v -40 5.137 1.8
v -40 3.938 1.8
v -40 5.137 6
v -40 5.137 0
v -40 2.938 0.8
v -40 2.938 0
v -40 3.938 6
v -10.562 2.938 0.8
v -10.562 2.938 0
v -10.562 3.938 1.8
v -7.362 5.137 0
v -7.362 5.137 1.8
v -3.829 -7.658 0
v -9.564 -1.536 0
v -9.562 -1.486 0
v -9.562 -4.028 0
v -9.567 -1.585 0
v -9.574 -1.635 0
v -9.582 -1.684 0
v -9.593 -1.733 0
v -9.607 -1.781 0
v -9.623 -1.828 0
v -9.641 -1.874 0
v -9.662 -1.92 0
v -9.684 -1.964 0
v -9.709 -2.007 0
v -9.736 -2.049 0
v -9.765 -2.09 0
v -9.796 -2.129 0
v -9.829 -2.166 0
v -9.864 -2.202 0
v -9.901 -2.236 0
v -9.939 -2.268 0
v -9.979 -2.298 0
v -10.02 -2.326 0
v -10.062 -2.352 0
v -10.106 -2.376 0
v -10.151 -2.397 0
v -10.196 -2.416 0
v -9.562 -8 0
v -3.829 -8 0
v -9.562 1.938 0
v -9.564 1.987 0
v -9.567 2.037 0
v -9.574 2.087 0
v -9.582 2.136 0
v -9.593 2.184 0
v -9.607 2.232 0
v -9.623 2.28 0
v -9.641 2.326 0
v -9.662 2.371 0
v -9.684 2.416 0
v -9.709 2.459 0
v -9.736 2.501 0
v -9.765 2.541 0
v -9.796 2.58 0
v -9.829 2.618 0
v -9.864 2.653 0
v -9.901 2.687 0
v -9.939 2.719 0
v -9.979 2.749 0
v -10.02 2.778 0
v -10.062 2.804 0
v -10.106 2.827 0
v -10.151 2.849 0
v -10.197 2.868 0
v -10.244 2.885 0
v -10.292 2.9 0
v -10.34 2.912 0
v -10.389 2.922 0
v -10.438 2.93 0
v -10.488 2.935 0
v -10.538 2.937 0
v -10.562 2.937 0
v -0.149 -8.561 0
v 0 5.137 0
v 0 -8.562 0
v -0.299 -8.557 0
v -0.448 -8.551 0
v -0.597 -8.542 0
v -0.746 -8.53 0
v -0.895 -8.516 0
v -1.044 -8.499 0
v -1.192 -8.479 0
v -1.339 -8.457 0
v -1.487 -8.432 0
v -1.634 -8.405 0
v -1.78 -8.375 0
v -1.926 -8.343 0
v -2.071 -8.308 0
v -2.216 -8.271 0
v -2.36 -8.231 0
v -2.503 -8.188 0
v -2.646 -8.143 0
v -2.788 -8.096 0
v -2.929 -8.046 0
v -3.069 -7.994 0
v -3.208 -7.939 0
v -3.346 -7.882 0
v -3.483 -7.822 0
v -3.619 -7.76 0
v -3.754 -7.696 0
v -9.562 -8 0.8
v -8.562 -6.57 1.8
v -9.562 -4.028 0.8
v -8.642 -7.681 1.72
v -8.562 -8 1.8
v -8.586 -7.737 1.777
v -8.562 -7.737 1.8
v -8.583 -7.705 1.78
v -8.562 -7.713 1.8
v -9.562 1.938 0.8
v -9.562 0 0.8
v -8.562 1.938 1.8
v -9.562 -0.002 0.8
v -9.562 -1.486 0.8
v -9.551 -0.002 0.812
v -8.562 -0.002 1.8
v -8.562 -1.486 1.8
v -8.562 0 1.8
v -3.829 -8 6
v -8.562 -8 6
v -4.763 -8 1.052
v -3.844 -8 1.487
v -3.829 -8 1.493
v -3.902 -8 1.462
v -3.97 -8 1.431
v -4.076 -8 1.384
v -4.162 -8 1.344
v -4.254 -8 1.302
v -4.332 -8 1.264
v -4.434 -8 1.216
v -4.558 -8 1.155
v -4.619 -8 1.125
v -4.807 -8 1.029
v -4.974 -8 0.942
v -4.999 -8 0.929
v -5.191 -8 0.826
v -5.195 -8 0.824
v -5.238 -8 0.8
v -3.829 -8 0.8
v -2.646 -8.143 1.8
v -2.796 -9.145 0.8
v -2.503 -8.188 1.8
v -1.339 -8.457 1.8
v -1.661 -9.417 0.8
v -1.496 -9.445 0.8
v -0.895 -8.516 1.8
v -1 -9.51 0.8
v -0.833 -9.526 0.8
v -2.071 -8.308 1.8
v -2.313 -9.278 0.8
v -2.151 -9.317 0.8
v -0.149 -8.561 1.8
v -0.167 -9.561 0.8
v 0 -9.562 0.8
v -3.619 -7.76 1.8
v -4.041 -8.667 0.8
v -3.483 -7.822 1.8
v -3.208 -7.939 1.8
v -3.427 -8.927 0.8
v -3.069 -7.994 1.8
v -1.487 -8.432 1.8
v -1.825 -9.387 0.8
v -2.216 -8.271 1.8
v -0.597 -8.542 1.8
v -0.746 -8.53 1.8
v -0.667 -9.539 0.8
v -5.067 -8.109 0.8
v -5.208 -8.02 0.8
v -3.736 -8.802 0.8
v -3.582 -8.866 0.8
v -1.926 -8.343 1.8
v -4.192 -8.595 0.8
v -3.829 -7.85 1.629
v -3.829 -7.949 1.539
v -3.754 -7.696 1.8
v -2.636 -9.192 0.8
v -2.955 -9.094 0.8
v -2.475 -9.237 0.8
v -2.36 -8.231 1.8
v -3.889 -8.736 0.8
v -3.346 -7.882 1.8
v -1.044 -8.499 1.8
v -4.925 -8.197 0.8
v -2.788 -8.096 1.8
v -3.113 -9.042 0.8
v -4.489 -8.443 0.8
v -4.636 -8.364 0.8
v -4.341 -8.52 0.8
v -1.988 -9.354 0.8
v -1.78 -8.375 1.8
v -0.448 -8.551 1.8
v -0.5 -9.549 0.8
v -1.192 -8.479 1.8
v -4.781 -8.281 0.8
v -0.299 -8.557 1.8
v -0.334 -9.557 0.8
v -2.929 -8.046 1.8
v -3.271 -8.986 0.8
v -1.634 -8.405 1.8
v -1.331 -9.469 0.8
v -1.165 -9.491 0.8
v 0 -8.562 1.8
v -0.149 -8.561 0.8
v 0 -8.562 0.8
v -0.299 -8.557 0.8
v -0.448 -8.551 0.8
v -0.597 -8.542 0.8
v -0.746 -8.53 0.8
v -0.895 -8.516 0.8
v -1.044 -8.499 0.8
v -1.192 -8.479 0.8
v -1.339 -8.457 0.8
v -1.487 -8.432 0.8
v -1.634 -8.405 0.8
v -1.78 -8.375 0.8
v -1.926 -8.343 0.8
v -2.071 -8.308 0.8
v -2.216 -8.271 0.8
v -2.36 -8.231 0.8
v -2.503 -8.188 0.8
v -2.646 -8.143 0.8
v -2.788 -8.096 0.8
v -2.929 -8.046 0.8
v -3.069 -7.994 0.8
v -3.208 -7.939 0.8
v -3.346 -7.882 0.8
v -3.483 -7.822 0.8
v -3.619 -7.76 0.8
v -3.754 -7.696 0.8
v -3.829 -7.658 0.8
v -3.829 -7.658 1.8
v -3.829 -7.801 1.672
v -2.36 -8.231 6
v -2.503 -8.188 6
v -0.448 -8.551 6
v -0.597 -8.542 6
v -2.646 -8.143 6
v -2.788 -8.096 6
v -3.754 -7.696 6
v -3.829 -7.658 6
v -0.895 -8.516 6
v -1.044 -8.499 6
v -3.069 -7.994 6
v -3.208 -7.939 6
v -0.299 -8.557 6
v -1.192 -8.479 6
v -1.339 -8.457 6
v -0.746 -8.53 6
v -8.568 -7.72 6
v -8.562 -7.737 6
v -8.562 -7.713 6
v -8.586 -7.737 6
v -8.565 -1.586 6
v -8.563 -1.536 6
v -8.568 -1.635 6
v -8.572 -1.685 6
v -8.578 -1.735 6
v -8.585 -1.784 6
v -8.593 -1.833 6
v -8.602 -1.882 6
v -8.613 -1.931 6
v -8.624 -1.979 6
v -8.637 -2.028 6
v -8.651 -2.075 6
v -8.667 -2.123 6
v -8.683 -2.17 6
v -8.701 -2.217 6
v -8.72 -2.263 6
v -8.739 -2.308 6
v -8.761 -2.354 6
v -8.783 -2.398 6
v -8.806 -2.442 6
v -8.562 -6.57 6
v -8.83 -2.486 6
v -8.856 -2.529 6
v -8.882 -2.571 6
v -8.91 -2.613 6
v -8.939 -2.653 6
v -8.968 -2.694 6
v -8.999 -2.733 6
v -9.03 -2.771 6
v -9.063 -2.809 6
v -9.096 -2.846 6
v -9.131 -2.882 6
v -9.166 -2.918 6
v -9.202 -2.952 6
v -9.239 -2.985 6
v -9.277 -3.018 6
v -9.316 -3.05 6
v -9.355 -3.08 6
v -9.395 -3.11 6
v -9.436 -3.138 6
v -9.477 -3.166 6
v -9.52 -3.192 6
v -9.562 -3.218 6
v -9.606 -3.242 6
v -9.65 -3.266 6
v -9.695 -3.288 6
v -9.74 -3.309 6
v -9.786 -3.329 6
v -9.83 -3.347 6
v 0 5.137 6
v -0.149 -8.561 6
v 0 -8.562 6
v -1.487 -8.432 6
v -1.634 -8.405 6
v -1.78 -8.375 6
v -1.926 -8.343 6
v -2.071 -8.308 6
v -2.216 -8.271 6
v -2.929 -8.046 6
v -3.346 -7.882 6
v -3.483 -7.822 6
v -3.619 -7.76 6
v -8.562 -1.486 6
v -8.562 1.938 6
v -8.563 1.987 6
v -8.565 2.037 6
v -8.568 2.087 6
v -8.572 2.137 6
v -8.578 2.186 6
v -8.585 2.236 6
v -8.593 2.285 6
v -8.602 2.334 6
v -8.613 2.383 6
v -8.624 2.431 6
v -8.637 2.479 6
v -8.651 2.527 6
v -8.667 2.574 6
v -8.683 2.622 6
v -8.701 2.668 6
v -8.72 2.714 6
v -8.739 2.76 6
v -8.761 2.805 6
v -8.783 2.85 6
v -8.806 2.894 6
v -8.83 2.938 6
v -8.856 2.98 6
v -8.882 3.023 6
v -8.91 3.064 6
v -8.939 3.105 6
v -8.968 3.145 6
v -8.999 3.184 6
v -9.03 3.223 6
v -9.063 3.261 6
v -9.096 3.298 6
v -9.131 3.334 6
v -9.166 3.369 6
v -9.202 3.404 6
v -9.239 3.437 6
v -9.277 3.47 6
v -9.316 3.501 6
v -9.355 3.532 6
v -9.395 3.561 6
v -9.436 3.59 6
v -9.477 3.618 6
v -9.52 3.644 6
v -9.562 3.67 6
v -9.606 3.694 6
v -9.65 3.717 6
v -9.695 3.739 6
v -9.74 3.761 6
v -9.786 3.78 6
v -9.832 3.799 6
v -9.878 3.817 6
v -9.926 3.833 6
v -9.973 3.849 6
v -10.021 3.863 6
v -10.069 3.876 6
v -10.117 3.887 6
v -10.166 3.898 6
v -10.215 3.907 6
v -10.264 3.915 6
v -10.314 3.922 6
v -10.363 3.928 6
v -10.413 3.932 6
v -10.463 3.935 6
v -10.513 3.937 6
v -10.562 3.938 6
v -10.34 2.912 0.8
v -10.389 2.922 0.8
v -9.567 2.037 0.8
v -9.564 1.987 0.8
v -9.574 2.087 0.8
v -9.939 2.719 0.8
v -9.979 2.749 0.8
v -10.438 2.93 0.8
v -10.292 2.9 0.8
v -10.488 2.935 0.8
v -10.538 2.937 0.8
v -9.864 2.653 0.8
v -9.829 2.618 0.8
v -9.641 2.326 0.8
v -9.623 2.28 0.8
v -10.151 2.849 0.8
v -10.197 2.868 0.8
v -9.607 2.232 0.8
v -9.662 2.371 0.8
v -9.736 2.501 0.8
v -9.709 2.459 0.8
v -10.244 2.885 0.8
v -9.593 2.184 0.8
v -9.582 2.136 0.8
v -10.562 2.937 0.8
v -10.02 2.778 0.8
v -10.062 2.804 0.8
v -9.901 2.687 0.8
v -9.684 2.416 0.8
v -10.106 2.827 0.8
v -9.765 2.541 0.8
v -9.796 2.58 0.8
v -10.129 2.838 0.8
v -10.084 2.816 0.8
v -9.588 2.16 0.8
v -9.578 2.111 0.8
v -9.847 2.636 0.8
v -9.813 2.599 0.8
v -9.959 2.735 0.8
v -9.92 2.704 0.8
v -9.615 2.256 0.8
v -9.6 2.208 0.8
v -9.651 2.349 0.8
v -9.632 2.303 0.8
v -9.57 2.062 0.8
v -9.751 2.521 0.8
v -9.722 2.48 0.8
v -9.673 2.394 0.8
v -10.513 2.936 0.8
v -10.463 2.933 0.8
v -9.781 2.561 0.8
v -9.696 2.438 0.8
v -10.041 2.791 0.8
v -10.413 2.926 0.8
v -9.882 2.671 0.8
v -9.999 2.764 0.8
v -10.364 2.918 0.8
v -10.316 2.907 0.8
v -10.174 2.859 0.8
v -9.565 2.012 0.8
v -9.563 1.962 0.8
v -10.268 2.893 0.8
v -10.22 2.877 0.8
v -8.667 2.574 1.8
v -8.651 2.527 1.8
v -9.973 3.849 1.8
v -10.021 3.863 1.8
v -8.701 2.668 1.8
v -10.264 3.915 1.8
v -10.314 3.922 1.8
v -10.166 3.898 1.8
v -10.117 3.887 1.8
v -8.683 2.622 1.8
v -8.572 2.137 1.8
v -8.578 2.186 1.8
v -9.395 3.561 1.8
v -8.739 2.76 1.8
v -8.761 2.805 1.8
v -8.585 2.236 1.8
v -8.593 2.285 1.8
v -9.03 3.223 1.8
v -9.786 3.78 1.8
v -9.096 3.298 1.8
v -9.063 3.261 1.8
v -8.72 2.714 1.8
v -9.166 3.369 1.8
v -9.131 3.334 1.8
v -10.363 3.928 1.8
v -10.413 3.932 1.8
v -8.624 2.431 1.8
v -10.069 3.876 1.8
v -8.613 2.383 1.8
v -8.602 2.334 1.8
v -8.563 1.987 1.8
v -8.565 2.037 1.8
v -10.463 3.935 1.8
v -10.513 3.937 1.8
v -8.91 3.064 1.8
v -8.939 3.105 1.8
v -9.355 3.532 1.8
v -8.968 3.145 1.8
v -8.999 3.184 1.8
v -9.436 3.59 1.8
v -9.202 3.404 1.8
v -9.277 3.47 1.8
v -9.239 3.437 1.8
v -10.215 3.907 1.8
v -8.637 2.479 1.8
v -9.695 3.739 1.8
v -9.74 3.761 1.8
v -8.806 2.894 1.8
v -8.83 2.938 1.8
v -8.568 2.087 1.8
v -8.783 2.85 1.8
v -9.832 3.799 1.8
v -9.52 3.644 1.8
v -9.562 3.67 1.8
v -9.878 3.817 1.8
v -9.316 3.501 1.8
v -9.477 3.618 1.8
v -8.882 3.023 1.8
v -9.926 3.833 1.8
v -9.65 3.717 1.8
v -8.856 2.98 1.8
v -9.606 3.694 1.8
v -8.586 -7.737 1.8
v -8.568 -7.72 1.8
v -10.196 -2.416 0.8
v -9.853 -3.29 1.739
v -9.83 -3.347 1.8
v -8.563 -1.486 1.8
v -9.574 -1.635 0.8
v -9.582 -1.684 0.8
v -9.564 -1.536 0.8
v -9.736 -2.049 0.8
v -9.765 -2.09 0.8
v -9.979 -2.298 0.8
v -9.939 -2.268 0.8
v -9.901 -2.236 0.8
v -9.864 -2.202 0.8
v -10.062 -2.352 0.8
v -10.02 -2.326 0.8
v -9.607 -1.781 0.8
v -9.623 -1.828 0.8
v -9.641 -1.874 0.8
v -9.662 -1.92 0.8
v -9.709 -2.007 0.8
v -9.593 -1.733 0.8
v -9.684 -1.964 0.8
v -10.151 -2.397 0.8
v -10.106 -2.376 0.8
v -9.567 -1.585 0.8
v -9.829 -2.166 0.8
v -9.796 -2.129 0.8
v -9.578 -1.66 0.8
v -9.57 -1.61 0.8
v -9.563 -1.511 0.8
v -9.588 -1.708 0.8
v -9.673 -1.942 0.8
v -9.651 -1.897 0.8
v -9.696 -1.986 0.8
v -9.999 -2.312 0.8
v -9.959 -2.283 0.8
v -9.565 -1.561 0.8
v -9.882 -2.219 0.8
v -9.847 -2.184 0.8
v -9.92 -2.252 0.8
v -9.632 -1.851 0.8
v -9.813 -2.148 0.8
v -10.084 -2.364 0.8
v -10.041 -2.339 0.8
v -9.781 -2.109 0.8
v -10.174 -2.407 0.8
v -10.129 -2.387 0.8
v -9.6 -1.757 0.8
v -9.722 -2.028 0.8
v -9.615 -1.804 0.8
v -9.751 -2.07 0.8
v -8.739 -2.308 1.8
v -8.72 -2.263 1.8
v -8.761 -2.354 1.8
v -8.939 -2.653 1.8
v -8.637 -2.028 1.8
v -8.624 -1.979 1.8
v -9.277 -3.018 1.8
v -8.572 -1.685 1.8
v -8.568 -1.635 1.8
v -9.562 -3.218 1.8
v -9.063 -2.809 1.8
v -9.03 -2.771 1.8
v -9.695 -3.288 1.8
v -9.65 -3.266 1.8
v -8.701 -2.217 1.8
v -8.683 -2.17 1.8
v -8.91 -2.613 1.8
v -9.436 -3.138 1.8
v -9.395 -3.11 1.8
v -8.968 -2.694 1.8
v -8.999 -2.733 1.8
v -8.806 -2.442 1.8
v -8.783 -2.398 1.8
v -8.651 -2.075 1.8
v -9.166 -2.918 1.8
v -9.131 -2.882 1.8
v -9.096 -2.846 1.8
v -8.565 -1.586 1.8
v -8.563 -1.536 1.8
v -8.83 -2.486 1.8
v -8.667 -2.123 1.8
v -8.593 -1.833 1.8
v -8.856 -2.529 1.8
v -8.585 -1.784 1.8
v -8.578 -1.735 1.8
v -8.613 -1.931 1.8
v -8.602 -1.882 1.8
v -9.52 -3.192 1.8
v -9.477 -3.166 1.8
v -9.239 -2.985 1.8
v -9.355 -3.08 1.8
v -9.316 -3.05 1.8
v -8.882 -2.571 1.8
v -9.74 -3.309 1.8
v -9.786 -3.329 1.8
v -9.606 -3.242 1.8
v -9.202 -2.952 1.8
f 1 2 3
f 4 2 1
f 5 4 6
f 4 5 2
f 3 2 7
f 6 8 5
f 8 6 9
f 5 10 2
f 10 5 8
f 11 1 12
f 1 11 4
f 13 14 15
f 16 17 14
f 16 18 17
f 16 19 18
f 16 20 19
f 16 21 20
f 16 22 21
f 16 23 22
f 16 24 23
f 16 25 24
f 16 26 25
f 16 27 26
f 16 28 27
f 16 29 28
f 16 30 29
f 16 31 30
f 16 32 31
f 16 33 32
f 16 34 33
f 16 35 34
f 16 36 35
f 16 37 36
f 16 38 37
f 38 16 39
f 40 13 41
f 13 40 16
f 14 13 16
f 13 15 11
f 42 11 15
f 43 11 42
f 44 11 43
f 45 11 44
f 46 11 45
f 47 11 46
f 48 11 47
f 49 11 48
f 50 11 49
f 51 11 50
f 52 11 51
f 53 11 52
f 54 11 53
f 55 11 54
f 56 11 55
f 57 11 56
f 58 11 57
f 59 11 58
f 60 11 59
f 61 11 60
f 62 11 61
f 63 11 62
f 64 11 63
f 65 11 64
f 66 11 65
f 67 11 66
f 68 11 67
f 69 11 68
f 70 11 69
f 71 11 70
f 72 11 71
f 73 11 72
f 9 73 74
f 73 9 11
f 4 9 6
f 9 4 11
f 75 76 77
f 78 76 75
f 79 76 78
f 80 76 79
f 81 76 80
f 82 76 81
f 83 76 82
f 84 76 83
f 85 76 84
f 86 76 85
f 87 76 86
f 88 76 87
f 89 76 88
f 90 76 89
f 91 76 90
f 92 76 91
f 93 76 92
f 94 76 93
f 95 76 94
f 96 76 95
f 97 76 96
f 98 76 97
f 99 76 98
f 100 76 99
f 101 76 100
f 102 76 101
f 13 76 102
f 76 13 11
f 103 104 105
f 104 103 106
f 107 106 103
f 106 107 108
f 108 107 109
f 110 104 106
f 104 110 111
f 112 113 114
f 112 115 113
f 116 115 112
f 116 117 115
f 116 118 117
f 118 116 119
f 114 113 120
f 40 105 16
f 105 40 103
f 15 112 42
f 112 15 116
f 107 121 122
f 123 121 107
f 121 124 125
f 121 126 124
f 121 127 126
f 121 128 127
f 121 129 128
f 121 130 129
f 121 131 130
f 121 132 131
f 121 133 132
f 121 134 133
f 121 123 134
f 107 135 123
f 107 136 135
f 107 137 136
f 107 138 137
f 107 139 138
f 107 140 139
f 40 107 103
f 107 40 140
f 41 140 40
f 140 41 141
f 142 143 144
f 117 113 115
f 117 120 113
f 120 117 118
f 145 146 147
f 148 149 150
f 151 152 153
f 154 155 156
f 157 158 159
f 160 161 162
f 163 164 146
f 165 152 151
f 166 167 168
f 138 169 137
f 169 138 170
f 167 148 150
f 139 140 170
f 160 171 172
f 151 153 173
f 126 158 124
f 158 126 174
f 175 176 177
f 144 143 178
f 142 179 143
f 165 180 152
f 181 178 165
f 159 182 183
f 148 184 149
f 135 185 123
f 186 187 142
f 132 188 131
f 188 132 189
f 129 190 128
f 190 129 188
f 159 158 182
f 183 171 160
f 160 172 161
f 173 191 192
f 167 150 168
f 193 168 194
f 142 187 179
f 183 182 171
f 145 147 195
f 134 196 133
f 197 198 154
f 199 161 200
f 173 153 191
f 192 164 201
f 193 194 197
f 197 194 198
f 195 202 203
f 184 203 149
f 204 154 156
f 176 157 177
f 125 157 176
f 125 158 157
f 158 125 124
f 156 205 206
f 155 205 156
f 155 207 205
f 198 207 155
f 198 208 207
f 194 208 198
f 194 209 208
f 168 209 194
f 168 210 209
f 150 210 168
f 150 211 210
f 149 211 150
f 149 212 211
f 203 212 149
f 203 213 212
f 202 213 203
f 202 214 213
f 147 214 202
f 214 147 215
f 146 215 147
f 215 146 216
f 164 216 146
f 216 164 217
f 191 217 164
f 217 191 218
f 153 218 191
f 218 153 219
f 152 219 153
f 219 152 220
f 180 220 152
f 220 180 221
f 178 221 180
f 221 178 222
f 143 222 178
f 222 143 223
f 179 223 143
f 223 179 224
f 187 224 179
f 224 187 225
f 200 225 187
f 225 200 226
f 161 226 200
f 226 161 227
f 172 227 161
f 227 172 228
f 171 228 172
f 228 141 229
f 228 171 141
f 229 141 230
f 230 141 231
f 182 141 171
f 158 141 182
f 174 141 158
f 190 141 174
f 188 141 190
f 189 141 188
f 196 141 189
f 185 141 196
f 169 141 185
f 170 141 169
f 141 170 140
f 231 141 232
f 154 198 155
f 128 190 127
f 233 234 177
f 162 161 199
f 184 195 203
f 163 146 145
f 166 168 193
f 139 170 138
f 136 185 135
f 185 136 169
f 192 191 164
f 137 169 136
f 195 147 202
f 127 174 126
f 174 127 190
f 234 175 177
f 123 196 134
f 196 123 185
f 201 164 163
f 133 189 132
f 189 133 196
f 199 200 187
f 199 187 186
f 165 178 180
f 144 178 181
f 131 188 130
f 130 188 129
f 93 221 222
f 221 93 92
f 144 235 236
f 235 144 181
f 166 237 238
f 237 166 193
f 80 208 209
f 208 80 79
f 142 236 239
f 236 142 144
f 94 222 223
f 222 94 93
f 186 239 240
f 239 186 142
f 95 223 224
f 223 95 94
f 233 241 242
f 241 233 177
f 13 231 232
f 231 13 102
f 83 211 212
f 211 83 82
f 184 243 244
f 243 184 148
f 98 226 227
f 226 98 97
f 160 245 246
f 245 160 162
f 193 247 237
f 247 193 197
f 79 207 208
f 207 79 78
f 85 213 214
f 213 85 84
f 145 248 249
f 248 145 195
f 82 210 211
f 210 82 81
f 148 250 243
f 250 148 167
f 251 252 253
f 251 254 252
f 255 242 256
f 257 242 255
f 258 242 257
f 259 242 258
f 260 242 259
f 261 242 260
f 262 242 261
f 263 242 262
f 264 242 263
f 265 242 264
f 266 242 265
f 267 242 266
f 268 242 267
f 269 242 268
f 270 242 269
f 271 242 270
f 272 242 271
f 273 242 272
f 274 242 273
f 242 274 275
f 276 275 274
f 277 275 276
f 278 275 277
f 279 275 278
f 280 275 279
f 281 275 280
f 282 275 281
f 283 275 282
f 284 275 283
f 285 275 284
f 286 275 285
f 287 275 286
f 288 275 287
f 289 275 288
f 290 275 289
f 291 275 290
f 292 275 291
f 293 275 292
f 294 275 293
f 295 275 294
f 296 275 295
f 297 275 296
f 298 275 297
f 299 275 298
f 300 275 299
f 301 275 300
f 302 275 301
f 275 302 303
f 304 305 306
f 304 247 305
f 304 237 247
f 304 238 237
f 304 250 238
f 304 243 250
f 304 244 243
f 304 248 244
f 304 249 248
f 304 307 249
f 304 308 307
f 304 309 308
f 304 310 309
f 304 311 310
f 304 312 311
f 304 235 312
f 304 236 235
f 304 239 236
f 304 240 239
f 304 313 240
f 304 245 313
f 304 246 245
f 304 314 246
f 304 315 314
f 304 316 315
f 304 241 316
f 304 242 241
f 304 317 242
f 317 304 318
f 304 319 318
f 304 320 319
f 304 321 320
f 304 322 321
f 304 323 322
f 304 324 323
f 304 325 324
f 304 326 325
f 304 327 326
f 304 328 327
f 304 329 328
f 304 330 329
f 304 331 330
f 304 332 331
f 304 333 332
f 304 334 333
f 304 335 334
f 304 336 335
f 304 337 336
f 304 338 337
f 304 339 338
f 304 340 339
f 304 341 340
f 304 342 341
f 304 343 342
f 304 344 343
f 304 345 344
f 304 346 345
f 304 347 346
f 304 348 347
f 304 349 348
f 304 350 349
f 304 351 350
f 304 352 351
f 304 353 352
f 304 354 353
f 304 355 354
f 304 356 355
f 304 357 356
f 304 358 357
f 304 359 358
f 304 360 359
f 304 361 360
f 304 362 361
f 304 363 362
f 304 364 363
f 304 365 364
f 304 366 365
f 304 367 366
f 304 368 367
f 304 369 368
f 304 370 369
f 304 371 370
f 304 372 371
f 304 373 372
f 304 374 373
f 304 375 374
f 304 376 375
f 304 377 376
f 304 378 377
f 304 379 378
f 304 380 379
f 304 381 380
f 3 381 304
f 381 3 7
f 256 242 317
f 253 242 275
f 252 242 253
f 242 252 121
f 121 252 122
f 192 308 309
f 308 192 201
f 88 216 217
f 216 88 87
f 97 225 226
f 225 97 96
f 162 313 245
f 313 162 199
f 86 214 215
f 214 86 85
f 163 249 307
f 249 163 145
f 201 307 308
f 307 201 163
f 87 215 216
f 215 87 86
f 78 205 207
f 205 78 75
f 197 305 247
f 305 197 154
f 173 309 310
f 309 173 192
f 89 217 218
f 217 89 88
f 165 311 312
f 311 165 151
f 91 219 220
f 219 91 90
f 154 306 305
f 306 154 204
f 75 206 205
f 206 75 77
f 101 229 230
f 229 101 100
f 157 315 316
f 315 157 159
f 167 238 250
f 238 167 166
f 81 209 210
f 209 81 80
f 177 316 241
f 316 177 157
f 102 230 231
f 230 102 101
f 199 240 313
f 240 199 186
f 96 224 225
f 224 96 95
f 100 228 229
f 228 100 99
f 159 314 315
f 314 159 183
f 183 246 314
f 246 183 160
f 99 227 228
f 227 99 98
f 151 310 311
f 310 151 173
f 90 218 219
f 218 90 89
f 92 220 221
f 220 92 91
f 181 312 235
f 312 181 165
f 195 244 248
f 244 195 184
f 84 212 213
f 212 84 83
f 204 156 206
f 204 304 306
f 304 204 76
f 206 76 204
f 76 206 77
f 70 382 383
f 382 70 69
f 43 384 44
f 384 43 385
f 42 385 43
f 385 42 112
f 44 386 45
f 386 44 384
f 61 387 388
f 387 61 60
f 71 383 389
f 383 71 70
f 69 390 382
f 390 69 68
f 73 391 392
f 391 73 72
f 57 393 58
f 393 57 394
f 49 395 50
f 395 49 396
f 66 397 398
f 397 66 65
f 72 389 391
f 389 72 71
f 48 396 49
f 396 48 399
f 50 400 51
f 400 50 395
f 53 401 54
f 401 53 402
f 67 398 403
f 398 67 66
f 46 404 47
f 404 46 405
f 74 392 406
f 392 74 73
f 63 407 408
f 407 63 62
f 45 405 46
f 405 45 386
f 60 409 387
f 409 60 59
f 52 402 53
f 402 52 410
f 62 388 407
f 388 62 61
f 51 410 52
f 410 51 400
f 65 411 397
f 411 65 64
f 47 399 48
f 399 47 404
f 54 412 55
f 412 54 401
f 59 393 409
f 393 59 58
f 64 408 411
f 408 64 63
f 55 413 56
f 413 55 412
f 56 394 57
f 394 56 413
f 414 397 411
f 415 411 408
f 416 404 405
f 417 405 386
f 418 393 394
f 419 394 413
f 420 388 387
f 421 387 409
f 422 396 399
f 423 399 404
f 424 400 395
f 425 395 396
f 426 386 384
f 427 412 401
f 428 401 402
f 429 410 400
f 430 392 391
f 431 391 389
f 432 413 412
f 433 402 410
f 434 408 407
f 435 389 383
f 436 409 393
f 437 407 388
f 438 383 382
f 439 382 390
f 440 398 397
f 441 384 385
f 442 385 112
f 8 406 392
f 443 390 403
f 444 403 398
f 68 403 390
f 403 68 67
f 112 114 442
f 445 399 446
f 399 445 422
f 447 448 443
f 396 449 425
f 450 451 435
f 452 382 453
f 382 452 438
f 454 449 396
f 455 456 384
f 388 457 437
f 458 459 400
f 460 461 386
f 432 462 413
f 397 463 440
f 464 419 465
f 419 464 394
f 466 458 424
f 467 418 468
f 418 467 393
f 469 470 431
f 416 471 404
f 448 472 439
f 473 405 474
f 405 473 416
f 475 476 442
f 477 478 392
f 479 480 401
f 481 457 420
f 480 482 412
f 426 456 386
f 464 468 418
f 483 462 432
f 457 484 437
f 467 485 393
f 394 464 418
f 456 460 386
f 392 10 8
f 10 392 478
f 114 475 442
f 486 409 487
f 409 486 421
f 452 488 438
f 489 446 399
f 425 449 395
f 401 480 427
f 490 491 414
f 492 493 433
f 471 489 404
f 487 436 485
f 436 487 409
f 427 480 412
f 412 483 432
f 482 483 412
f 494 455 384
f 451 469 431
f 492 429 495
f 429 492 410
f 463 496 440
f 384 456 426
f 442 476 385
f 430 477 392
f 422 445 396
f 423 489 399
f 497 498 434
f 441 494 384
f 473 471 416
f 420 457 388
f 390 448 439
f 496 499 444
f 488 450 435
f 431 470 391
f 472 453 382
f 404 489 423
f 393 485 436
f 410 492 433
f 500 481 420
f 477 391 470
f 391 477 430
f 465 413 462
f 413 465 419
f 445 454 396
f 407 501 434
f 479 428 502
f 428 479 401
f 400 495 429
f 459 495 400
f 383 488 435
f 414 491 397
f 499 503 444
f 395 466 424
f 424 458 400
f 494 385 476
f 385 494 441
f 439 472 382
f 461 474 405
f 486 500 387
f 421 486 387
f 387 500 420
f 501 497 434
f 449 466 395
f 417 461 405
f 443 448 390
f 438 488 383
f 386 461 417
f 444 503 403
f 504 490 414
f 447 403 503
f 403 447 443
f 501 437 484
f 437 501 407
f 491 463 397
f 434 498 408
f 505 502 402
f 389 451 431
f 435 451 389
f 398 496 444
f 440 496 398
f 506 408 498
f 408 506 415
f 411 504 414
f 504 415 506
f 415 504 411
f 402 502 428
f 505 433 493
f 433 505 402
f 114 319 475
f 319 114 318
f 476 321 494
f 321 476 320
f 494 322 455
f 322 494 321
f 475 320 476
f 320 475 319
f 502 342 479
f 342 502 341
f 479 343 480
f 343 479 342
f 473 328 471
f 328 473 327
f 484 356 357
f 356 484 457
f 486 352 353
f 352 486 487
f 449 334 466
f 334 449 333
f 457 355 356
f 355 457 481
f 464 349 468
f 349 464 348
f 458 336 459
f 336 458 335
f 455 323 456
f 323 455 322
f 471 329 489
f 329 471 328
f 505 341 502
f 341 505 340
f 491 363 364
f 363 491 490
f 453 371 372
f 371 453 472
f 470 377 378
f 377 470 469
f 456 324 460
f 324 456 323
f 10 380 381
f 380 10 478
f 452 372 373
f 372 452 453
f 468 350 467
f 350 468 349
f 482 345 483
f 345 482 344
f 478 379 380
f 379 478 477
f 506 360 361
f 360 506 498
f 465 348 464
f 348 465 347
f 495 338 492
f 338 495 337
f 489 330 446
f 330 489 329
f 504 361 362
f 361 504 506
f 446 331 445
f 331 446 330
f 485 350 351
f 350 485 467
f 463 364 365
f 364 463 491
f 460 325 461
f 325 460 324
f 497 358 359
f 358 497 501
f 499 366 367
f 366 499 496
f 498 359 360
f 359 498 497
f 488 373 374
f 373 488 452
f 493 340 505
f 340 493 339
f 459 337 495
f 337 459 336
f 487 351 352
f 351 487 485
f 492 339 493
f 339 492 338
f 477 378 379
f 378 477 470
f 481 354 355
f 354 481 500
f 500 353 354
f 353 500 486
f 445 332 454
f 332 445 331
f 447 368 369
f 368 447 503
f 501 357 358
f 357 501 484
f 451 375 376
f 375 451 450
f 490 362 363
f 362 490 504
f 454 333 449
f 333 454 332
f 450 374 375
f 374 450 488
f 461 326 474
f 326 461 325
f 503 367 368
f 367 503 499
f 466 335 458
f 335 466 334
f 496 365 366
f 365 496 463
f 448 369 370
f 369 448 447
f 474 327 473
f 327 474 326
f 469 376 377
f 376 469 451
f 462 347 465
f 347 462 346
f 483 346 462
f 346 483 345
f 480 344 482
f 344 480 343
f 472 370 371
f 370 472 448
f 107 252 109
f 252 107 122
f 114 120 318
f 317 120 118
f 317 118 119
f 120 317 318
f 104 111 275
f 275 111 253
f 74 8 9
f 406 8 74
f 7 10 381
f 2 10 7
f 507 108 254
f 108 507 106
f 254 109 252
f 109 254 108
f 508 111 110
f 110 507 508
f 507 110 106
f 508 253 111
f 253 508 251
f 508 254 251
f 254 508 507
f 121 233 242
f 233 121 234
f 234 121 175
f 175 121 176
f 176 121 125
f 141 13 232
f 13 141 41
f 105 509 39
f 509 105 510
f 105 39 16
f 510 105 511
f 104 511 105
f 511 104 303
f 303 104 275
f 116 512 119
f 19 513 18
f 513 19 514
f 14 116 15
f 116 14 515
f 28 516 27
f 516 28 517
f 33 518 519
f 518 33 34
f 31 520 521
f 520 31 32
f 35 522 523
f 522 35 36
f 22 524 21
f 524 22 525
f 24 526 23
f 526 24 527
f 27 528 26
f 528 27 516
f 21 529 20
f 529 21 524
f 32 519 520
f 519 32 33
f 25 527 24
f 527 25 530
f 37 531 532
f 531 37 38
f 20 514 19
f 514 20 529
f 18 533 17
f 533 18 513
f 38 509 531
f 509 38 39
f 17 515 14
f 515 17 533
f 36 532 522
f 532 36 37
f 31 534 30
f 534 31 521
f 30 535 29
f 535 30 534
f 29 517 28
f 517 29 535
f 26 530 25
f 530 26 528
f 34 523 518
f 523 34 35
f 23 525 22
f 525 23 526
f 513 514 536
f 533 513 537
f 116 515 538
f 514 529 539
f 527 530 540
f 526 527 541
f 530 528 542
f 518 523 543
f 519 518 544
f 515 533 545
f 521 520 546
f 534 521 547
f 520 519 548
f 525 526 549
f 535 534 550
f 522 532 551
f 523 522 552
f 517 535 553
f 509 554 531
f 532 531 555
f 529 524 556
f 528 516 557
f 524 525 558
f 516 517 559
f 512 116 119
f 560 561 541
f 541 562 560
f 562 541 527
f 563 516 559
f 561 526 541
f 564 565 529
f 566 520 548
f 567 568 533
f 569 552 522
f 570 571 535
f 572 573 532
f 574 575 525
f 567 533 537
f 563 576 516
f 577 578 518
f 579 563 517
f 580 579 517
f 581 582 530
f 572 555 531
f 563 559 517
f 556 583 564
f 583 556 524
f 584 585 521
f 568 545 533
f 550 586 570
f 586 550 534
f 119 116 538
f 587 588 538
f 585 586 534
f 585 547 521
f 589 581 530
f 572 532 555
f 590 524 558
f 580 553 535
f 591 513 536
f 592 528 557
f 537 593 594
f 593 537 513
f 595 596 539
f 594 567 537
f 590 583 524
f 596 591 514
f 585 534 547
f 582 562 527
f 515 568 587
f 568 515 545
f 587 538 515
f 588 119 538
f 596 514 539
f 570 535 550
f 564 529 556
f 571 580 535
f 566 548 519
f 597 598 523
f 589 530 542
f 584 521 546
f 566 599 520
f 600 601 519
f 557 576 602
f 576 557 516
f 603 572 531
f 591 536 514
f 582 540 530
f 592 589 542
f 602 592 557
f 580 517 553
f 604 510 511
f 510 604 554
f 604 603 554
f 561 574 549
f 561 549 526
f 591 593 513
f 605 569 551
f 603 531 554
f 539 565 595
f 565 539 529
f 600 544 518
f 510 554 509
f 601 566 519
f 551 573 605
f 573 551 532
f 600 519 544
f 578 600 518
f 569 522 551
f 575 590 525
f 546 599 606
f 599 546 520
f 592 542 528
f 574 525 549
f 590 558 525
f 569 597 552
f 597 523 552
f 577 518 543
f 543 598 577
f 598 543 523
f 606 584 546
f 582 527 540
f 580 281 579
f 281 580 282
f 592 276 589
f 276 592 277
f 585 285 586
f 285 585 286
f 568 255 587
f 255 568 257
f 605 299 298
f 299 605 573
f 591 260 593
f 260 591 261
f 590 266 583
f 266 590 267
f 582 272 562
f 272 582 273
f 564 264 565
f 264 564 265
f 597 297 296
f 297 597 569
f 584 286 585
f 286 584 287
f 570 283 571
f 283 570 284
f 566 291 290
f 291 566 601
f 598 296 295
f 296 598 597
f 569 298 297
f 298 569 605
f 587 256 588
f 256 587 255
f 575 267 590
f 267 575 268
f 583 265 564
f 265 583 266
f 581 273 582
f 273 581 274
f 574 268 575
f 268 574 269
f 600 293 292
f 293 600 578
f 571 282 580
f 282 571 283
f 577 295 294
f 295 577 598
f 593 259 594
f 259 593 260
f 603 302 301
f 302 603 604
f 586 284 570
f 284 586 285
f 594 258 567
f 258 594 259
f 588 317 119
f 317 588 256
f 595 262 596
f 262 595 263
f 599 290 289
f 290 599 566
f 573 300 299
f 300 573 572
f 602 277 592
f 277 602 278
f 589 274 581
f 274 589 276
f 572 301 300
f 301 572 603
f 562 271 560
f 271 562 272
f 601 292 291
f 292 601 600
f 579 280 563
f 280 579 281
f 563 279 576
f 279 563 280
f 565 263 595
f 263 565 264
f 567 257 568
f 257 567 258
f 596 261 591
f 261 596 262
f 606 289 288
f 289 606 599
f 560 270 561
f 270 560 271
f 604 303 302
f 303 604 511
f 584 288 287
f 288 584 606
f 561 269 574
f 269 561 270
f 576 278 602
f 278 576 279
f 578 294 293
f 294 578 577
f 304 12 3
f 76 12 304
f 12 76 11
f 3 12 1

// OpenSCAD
// file: ../scad/shape_modifier_utils.scad
// Overlap used to break coincident faces in booleans. Subtracting a cut that lands
// exactly on a surface leaves zero-thickness geometry, which renders unpredictably and
// slices worse; every cut is extended by this much so the faces genuinely cross.
//
// A function rather than a variable: `use <...>` exports functions but not top-level
// variable assignments, and the sweep reaches these files through `use`. Twelve modules
// across four files each declared their own `eps = 0.01` before this existed.
function geometry_eps() = 0.01;

// Length for a *centred* cutting solid that must pass entirely through material of
// depth `extent`. A centred cut reaches half this each way, so the factor leaves 50%
// clearance beyond `extent` on both sides -- a cut that lands flush on a face produces
// a zero-thickness shell rather than a clean hole.
//
// Measured against the swept parameter space: the deepest thing any of these cuts must
// clear is one bulkhead_section, one bulkhead_thickness tall, so the margin is 0.5 *
// bulkhead_thickness everywhere and scales with the part. Interconnect bulkheads stack
// two sections, but each section's cuts are applied before stacking, so the stack is
// not what a cut has to span.
function through_cut(extent) = 3 * extent;

// Distance at which to place a mask vertex so it lies outside anything within `extent`
// of the origin. Used by the half-plane polygons that trim an octant down to its
// wedge, where the vertex position only has to be "far enough" to be off the part.
//
// Worst case across 412 valid combinations is 3.25 mm of clearance, at U=0.5 with 1 mm
// panel: the shape reaches panel_offset + panel_overlap = 6.75 mm while the mask sits
// at 10 mm. Positive everywhere, and the gap widens with U.
function mask_reach(extent) = 2 * extent;


module octant_to_full() {
    mirror_x() {
        mirror_y() {
            mirror_xy() {
                children();
            }
        }
    }
}

module mirror_x() {
    union() {
        children();
        mirror([-1,0,0]) {
            children();
        }
    }
    
}

module mirror_y() {
    union() {
        children();
        mirror([0,-1,0]) {
            children();
        }
    }
    
}

module mirror_xy() {
    union() {
        children();
        mirror([1,-1,0]) {
            children();
        }
    }
}

module corner_translate(unit_width, corner_radius) {
    translate([unit_width/2-corner_radius,unit_width/2-corner_radius,0]) {
        children();
    }
}

// Move an octant out to its corner, then mirror it into all four -- the standard way
// a bulkhead profile is built from the one octant that is actually drawn.
//
// Every `*_shape` wrapper in fuselage_bulkhead_geometry.scad had this same pair open-
// coded around its own `*_octant` call. The wrappers stay: they name the full shape as
// distinct from the octant, and they are what seven call sites across two files use.
// It is the repeated body that is worth removing, not the interface.
module octant_tiled(unit_width, corner_radius) {
    octant_to_full() {
        corner_translate(unit_width, corner_radius) {
            children();
        }
    }
}


// mask lower diagonal quadrant
module octant_mask(unit_width, corner_radius) {
    eps = geometry_eps();
    polygon([[corner_radius+eps,corner_radius],
            [corner_radius+eps,-unit_width/2-corner_radius],
            [-unit_width/2-corner_radius+eps,-unit_width/2-corner_radius]]);
}

// fillet inward
module fillet_inner(radius) {
    intersection() {
        offset(r = -radius) {
            // fillet outward as well to ensure we round off any inward fillet artifacts (from input boundaries that are closer than 2*radius)
            offset(r = 2*radius) {
                offset(r = -radius) {
                    children();
                }
            }
        }
        // guarantee that the resultant shape has not gone outside the boundaries of the input shape
        children();
    }
}

// fillet outward
module fillet_outer(radius) {
    union() {
        offset(r = -radius) {
            offset(r = radius) {
                children();
            }
        }
        // guarantee that the resultant shape has not erroded into the boundaries of teh input shape
        children();
    }
}
// main file
// bulkhead_flange_positive as a whole, at the same parameters its constituents were checked
// at one by one. This is the reference that binds ref_flange_boss.scad's transcription of
// the inline quadrant block: that file only proves the port matches the transcription, this
// one goes through the real module.
//
// Derived parameters for U=1.0 end_bolt 3/16in.
$fa=1;
$fs=0.05;

use <../scad/fuselage_bulkhead_geometry.scad>

make_web = true;
is_interconnect = false;
is_cowling = false;
unit_width = 100.0;
bulkhead_thickness = 6;
corner_radius = 10.0;
panel_thickness = 4.7625;
panel_offset = 2.5;
panel_overlap = 4.7625;
panel_tolerance = 0.1;
bolt_hole_radius = 2.0;
bolt_thickness = 3.0;
bolt_offset = 8.0;
plate_thickness = 0.8;
flange_fillet_radius = 2.0;
flange_thickness = 1.2;
flange_chamfer = 1.0;

bulkhead_flange_positive(make_web, is_interconnect, is_cowling, unit_width,
                         bulkhead_thickness, corner_radius, panel_thickness, panel_offset,
                         panel_overlap, panel_tolerance, bolt_hole_radius, bolt_thickness,
                         bolt_offset, plate_thickness, flange_fillet_radius,
                         flange_thickness, flange_chamfer);
